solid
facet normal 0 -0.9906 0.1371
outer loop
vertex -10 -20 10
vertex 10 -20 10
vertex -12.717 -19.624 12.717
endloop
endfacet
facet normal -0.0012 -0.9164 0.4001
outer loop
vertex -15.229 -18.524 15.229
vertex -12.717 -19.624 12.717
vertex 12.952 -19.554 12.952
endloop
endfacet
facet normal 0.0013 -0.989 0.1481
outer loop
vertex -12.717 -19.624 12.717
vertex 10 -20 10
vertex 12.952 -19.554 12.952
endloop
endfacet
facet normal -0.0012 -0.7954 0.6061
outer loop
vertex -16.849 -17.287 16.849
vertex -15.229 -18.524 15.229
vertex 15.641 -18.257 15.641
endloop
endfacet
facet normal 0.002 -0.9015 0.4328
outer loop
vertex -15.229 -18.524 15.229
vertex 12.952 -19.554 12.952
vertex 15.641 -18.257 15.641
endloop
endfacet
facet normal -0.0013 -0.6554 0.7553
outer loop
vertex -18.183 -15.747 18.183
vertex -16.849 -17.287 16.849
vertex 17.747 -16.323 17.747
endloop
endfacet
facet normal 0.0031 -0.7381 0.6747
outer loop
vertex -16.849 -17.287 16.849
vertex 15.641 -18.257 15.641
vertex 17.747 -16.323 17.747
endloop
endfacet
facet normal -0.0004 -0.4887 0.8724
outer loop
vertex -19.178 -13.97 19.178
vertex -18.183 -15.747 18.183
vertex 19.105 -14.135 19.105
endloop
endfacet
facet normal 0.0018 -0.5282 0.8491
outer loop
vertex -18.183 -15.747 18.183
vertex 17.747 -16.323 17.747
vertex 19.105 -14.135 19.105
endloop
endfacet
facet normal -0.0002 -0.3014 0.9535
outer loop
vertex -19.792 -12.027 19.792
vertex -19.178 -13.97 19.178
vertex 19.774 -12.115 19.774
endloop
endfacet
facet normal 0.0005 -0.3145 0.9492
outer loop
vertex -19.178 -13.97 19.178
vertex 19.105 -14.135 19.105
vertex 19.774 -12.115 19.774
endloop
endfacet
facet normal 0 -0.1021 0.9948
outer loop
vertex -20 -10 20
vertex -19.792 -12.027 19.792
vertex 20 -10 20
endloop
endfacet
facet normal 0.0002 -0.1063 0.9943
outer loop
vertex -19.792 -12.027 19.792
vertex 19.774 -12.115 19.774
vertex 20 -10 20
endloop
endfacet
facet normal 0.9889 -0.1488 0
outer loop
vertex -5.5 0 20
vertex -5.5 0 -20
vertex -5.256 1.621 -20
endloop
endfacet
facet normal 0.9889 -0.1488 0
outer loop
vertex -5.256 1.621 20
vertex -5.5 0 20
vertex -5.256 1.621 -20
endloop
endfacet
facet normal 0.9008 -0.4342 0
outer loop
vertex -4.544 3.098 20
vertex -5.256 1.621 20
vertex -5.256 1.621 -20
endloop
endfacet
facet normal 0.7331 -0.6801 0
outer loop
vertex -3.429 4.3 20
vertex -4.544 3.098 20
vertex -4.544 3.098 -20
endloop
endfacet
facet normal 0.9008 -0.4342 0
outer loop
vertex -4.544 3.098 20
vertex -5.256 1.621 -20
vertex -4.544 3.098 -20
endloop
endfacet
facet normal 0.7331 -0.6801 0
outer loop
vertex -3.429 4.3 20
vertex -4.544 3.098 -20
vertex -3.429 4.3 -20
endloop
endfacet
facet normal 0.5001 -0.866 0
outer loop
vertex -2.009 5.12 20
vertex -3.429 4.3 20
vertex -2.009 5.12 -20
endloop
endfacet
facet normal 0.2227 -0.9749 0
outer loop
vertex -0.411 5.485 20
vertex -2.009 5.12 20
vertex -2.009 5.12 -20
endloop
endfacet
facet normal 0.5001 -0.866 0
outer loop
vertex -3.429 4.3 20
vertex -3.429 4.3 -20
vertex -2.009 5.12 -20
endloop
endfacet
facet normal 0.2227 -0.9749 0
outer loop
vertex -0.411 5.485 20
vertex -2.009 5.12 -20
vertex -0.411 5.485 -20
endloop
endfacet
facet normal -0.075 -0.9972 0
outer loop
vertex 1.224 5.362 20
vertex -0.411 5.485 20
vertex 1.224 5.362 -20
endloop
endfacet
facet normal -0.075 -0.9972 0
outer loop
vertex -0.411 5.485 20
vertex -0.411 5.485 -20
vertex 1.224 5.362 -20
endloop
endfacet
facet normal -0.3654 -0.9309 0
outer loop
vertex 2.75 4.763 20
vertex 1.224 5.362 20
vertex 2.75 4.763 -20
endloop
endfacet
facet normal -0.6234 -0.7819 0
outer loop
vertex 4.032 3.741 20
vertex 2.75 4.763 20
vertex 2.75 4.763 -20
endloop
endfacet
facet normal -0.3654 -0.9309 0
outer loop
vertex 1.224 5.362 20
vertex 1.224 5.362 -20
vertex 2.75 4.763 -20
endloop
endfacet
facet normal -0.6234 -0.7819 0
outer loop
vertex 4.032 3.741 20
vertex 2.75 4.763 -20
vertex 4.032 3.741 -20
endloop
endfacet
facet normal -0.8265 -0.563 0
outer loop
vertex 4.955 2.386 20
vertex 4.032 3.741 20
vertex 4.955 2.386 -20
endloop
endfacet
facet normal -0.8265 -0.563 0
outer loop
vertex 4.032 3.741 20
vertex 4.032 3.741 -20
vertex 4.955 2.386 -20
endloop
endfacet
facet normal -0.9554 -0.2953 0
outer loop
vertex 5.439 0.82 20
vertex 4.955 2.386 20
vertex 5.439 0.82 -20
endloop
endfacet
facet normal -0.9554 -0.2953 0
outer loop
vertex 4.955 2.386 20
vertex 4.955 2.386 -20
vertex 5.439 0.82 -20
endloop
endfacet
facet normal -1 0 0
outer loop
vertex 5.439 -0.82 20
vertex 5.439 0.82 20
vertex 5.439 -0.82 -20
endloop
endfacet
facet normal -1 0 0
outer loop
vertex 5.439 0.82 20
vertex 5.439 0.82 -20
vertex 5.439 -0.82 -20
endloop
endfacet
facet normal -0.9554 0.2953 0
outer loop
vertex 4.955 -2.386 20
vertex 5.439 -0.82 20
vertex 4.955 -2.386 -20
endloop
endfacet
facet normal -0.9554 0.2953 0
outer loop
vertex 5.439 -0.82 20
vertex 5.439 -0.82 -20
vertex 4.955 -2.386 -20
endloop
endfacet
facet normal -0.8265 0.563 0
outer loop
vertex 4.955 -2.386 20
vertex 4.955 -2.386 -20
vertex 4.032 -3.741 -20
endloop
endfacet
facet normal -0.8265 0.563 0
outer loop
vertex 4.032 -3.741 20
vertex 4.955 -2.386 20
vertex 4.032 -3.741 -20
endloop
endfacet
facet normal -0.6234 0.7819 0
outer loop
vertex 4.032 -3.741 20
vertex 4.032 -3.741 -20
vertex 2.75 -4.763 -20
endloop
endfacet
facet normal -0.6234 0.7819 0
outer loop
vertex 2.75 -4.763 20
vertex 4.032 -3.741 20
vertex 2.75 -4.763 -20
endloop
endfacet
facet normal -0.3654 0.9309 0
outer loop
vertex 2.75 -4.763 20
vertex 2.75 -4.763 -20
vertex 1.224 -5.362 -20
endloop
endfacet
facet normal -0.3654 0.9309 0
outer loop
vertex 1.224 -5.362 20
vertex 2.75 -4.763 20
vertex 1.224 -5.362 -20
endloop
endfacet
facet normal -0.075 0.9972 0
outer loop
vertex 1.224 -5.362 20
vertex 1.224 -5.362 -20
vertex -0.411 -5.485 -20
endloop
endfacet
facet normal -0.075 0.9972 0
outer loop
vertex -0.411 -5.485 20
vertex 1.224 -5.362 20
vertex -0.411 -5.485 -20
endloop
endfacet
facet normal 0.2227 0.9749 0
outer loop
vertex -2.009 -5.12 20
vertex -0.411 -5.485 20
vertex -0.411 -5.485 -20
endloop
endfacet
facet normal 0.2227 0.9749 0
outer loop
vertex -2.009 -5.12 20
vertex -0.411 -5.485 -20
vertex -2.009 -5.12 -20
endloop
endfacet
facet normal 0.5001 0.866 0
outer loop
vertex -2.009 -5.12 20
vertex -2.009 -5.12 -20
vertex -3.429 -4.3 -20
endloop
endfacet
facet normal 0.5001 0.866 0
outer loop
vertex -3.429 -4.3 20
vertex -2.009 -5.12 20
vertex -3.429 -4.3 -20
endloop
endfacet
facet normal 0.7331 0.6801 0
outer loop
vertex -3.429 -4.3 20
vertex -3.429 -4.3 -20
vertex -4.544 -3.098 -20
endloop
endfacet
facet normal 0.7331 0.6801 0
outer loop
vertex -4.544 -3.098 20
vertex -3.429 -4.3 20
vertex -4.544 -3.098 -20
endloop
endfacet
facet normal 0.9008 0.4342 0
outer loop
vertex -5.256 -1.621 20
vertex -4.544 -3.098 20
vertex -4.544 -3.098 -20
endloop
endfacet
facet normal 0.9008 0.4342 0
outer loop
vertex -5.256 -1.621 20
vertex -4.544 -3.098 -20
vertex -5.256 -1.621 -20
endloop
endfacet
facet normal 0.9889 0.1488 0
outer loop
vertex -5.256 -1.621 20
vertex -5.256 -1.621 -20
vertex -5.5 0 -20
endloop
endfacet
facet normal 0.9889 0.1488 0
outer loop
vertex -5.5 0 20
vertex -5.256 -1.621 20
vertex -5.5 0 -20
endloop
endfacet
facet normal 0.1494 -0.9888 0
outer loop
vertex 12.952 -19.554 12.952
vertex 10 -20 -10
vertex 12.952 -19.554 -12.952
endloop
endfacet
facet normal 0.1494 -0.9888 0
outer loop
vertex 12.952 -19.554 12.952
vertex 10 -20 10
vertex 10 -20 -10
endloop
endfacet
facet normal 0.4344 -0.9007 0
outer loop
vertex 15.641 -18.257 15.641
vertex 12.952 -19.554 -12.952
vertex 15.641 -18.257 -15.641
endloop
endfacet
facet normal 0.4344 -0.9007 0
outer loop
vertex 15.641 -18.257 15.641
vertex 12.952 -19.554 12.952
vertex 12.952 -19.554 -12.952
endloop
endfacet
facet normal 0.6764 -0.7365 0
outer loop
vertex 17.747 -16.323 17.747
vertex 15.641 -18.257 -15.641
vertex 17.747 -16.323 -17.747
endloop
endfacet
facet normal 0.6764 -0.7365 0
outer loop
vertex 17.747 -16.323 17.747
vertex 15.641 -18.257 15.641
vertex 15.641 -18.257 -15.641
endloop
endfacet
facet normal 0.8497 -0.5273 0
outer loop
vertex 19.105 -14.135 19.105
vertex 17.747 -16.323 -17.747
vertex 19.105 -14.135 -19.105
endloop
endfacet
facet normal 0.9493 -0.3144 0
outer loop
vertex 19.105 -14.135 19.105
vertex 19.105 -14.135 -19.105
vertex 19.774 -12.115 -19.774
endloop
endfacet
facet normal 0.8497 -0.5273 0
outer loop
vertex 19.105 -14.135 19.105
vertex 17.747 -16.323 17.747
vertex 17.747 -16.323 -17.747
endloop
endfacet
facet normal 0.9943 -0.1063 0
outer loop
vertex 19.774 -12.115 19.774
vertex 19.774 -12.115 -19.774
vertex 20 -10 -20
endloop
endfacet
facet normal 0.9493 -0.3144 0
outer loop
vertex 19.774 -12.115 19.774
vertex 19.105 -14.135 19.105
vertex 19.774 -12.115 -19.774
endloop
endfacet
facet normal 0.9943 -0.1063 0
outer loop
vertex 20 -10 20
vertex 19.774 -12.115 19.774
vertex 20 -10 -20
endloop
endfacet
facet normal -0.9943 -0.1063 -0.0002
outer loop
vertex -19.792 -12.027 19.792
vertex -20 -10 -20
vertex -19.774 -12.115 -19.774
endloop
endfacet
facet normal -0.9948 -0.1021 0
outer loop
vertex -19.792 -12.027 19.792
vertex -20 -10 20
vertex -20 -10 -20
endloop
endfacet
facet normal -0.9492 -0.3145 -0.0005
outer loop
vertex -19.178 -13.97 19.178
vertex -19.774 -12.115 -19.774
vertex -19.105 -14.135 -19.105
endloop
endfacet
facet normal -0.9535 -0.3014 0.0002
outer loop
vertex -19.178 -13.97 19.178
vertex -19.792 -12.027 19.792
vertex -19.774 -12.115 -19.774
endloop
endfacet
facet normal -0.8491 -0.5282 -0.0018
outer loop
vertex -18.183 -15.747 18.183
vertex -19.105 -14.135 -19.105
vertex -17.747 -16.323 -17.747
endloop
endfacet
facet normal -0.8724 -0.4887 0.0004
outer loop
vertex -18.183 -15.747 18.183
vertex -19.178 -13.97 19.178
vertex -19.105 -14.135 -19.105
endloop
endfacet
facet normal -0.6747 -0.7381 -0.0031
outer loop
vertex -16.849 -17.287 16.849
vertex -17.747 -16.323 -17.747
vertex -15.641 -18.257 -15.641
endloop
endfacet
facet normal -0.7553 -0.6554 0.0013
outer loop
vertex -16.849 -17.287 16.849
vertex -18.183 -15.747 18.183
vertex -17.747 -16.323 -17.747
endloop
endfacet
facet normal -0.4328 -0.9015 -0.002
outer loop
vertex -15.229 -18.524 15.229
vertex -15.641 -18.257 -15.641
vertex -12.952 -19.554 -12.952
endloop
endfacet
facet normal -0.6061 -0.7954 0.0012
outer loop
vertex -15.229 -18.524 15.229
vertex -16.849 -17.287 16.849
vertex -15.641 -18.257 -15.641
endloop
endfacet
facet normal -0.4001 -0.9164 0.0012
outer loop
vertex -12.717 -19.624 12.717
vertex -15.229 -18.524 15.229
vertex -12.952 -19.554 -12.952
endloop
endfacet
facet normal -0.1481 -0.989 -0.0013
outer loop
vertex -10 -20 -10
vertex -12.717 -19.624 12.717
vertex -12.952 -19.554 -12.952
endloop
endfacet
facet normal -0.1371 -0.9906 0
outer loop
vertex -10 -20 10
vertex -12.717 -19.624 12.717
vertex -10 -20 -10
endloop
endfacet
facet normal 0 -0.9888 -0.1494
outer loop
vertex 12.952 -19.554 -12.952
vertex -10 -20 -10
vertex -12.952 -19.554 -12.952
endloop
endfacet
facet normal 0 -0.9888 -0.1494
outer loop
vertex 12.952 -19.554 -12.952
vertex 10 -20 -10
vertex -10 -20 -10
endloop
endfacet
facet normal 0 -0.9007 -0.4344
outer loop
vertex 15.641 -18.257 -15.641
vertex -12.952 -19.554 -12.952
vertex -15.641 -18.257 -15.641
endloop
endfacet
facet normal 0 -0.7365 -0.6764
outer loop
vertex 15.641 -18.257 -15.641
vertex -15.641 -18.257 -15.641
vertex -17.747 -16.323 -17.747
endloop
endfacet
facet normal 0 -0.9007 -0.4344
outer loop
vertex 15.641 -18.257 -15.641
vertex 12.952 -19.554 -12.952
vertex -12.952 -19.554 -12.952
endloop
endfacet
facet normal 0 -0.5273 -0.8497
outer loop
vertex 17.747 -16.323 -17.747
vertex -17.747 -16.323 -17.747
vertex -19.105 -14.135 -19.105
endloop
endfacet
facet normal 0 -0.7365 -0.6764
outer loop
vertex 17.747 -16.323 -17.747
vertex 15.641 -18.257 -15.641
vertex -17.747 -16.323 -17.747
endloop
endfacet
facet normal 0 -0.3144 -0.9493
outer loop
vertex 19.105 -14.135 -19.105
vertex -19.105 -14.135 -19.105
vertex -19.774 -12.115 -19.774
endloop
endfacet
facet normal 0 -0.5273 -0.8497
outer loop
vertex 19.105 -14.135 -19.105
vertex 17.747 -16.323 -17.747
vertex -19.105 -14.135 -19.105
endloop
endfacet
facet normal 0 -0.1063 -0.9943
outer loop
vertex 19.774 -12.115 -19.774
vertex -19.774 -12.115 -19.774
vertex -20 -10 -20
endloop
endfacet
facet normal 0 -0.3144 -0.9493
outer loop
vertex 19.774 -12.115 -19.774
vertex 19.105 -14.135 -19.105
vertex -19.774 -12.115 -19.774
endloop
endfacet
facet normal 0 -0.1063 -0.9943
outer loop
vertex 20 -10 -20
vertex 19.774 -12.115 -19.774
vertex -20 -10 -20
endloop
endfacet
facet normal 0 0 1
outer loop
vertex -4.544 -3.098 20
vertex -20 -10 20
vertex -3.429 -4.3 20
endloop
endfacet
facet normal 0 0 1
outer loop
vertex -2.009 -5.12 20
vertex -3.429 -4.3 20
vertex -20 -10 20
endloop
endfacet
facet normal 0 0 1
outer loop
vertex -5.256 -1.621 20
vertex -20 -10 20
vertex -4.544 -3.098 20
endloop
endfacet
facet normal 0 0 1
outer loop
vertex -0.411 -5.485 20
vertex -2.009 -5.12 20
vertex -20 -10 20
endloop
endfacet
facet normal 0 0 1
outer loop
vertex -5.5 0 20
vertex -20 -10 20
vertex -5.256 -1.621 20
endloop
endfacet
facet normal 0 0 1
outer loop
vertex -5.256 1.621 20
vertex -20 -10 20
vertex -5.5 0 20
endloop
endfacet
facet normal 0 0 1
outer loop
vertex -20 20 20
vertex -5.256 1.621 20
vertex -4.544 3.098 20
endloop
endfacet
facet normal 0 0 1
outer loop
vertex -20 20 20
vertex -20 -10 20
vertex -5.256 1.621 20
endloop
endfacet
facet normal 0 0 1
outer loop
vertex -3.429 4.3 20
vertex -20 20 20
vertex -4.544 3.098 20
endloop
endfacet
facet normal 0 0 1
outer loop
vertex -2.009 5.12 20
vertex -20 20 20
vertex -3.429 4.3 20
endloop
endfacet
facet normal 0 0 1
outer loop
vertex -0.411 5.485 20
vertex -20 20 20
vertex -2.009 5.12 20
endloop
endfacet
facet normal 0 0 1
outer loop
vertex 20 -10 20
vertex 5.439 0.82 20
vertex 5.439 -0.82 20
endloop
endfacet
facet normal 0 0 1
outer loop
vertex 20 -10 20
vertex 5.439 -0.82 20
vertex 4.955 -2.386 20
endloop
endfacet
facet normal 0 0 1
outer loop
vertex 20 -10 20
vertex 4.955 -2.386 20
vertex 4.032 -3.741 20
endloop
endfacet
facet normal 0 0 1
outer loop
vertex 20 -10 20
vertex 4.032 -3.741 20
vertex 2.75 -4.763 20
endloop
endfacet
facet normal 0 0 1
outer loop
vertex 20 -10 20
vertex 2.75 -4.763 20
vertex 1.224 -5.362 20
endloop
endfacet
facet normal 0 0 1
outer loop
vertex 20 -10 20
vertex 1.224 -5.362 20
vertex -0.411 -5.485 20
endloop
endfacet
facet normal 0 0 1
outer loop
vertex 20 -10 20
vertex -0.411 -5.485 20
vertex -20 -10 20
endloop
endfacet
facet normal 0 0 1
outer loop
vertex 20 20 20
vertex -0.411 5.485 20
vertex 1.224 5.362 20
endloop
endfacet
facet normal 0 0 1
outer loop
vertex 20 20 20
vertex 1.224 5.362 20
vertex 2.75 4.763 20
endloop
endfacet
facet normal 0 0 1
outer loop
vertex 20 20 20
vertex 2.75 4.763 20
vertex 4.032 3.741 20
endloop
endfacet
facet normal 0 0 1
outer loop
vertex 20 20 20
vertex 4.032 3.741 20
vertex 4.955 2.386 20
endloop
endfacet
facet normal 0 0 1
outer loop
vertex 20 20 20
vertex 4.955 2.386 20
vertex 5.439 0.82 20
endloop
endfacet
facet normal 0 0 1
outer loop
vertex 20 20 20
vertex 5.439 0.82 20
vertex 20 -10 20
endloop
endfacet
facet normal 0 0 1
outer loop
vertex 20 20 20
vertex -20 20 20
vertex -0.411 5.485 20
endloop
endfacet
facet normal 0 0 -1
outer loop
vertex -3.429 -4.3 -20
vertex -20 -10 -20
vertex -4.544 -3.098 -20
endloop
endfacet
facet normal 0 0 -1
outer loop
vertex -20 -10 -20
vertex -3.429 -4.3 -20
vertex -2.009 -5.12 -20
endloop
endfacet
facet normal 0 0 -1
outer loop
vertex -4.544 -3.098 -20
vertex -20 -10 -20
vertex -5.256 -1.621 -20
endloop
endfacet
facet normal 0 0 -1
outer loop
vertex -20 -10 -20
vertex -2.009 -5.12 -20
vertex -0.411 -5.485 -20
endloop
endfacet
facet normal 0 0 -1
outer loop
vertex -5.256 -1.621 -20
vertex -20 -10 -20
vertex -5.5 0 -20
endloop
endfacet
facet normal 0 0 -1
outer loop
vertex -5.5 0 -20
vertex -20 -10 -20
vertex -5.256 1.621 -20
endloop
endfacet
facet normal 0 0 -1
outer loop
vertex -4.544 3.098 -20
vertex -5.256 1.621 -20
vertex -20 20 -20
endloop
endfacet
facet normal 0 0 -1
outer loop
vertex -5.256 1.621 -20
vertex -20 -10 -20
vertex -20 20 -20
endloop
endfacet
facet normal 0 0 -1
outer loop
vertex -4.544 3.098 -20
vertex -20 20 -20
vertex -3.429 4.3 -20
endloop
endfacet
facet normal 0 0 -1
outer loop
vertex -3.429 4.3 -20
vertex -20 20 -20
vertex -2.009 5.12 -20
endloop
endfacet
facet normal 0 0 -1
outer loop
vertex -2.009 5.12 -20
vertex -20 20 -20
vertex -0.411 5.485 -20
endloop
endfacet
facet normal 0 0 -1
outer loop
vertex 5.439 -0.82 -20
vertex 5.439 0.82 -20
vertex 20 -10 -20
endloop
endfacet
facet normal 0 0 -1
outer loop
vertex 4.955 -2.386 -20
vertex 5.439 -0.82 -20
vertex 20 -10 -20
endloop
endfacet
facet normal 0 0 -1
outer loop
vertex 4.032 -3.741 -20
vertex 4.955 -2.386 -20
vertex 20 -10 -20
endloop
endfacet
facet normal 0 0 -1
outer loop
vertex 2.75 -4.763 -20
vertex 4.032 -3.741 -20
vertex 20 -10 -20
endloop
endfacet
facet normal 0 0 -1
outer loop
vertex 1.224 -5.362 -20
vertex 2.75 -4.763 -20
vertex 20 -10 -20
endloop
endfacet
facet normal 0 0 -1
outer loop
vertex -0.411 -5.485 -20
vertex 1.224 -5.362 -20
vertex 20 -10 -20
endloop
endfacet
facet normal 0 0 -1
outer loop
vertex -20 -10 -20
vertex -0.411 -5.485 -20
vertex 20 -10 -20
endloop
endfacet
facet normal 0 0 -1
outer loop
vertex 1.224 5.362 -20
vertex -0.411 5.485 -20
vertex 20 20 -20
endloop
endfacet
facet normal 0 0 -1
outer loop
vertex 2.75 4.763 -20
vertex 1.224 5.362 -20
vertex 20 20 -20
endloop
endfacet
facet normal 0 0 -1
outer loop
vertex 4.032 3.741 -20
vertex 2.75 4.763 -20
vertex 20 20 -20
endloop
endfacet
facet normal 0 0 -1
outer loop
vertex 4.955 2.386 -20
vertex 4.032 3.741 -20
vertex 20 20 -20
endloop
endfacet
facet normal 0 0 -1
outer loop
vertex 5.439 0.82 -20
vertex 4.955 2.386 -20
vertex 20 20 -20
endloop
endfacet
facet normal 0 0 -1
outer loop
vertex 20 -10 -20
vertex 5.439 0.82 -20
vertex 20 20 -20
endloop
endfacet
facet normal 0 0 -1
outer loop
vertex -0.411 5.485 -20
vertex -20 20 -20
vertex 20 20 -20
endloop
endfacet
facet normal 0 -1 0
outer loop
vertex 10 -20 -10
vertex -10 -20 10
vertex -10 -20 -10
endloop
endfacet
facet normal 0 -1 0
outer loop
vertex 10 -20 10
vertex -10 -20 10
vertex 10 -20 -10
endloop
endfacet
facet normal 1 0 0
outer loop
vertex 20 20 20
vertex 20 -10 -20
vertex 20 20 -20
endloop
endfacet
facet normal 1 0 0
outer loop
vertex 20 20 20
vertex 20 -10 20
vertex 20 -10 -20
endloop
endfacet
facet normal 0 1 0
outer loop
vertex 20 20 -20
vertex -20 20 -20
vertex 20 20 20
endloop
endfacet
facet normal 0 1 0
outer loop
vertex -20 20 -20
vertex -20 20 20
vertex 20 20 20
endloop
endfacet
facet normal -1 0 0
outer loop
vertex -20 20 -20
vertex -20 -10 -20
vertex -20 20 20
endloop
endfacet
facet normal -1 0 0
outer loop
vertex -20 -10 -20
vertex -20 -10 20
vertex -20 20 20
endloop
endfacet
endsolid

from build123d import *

# Parameters (mm, degrees)
F0_W          = 40
F0_H          = 40
F1_DEPTH      = 20
F1_DEPTH_BACK = 20
F3_D          = 11
F4_R          = 10


with BuildPart() as f1:
    # F0 (on Top) → F1 (new body, two sides)
    with BuildSketch(Plane.XY) as f1_sk:
        Rectangle(F0_W, F0_H)
    extrude(amount=F1_DEPTH)
    extrude(f1_sk.sketch, amount=-F1_DEPTH_BACK)

    # F3 (through all)
    with Locations(Plane.XY.offset(20)):
        with Locations((0, 0)):
            Hole(F3_D / 2)

    # F4
    f4_edges = [f1.edges().sort_by_distance(p)[0] for p in [
        (0, -20, -20),
        (20, -20, 0),
        (-20, -20, 0),
        (0, -20, 20),
    ]]
    fillet(f4_edges, radius=F4_R)


solid = f1.part
